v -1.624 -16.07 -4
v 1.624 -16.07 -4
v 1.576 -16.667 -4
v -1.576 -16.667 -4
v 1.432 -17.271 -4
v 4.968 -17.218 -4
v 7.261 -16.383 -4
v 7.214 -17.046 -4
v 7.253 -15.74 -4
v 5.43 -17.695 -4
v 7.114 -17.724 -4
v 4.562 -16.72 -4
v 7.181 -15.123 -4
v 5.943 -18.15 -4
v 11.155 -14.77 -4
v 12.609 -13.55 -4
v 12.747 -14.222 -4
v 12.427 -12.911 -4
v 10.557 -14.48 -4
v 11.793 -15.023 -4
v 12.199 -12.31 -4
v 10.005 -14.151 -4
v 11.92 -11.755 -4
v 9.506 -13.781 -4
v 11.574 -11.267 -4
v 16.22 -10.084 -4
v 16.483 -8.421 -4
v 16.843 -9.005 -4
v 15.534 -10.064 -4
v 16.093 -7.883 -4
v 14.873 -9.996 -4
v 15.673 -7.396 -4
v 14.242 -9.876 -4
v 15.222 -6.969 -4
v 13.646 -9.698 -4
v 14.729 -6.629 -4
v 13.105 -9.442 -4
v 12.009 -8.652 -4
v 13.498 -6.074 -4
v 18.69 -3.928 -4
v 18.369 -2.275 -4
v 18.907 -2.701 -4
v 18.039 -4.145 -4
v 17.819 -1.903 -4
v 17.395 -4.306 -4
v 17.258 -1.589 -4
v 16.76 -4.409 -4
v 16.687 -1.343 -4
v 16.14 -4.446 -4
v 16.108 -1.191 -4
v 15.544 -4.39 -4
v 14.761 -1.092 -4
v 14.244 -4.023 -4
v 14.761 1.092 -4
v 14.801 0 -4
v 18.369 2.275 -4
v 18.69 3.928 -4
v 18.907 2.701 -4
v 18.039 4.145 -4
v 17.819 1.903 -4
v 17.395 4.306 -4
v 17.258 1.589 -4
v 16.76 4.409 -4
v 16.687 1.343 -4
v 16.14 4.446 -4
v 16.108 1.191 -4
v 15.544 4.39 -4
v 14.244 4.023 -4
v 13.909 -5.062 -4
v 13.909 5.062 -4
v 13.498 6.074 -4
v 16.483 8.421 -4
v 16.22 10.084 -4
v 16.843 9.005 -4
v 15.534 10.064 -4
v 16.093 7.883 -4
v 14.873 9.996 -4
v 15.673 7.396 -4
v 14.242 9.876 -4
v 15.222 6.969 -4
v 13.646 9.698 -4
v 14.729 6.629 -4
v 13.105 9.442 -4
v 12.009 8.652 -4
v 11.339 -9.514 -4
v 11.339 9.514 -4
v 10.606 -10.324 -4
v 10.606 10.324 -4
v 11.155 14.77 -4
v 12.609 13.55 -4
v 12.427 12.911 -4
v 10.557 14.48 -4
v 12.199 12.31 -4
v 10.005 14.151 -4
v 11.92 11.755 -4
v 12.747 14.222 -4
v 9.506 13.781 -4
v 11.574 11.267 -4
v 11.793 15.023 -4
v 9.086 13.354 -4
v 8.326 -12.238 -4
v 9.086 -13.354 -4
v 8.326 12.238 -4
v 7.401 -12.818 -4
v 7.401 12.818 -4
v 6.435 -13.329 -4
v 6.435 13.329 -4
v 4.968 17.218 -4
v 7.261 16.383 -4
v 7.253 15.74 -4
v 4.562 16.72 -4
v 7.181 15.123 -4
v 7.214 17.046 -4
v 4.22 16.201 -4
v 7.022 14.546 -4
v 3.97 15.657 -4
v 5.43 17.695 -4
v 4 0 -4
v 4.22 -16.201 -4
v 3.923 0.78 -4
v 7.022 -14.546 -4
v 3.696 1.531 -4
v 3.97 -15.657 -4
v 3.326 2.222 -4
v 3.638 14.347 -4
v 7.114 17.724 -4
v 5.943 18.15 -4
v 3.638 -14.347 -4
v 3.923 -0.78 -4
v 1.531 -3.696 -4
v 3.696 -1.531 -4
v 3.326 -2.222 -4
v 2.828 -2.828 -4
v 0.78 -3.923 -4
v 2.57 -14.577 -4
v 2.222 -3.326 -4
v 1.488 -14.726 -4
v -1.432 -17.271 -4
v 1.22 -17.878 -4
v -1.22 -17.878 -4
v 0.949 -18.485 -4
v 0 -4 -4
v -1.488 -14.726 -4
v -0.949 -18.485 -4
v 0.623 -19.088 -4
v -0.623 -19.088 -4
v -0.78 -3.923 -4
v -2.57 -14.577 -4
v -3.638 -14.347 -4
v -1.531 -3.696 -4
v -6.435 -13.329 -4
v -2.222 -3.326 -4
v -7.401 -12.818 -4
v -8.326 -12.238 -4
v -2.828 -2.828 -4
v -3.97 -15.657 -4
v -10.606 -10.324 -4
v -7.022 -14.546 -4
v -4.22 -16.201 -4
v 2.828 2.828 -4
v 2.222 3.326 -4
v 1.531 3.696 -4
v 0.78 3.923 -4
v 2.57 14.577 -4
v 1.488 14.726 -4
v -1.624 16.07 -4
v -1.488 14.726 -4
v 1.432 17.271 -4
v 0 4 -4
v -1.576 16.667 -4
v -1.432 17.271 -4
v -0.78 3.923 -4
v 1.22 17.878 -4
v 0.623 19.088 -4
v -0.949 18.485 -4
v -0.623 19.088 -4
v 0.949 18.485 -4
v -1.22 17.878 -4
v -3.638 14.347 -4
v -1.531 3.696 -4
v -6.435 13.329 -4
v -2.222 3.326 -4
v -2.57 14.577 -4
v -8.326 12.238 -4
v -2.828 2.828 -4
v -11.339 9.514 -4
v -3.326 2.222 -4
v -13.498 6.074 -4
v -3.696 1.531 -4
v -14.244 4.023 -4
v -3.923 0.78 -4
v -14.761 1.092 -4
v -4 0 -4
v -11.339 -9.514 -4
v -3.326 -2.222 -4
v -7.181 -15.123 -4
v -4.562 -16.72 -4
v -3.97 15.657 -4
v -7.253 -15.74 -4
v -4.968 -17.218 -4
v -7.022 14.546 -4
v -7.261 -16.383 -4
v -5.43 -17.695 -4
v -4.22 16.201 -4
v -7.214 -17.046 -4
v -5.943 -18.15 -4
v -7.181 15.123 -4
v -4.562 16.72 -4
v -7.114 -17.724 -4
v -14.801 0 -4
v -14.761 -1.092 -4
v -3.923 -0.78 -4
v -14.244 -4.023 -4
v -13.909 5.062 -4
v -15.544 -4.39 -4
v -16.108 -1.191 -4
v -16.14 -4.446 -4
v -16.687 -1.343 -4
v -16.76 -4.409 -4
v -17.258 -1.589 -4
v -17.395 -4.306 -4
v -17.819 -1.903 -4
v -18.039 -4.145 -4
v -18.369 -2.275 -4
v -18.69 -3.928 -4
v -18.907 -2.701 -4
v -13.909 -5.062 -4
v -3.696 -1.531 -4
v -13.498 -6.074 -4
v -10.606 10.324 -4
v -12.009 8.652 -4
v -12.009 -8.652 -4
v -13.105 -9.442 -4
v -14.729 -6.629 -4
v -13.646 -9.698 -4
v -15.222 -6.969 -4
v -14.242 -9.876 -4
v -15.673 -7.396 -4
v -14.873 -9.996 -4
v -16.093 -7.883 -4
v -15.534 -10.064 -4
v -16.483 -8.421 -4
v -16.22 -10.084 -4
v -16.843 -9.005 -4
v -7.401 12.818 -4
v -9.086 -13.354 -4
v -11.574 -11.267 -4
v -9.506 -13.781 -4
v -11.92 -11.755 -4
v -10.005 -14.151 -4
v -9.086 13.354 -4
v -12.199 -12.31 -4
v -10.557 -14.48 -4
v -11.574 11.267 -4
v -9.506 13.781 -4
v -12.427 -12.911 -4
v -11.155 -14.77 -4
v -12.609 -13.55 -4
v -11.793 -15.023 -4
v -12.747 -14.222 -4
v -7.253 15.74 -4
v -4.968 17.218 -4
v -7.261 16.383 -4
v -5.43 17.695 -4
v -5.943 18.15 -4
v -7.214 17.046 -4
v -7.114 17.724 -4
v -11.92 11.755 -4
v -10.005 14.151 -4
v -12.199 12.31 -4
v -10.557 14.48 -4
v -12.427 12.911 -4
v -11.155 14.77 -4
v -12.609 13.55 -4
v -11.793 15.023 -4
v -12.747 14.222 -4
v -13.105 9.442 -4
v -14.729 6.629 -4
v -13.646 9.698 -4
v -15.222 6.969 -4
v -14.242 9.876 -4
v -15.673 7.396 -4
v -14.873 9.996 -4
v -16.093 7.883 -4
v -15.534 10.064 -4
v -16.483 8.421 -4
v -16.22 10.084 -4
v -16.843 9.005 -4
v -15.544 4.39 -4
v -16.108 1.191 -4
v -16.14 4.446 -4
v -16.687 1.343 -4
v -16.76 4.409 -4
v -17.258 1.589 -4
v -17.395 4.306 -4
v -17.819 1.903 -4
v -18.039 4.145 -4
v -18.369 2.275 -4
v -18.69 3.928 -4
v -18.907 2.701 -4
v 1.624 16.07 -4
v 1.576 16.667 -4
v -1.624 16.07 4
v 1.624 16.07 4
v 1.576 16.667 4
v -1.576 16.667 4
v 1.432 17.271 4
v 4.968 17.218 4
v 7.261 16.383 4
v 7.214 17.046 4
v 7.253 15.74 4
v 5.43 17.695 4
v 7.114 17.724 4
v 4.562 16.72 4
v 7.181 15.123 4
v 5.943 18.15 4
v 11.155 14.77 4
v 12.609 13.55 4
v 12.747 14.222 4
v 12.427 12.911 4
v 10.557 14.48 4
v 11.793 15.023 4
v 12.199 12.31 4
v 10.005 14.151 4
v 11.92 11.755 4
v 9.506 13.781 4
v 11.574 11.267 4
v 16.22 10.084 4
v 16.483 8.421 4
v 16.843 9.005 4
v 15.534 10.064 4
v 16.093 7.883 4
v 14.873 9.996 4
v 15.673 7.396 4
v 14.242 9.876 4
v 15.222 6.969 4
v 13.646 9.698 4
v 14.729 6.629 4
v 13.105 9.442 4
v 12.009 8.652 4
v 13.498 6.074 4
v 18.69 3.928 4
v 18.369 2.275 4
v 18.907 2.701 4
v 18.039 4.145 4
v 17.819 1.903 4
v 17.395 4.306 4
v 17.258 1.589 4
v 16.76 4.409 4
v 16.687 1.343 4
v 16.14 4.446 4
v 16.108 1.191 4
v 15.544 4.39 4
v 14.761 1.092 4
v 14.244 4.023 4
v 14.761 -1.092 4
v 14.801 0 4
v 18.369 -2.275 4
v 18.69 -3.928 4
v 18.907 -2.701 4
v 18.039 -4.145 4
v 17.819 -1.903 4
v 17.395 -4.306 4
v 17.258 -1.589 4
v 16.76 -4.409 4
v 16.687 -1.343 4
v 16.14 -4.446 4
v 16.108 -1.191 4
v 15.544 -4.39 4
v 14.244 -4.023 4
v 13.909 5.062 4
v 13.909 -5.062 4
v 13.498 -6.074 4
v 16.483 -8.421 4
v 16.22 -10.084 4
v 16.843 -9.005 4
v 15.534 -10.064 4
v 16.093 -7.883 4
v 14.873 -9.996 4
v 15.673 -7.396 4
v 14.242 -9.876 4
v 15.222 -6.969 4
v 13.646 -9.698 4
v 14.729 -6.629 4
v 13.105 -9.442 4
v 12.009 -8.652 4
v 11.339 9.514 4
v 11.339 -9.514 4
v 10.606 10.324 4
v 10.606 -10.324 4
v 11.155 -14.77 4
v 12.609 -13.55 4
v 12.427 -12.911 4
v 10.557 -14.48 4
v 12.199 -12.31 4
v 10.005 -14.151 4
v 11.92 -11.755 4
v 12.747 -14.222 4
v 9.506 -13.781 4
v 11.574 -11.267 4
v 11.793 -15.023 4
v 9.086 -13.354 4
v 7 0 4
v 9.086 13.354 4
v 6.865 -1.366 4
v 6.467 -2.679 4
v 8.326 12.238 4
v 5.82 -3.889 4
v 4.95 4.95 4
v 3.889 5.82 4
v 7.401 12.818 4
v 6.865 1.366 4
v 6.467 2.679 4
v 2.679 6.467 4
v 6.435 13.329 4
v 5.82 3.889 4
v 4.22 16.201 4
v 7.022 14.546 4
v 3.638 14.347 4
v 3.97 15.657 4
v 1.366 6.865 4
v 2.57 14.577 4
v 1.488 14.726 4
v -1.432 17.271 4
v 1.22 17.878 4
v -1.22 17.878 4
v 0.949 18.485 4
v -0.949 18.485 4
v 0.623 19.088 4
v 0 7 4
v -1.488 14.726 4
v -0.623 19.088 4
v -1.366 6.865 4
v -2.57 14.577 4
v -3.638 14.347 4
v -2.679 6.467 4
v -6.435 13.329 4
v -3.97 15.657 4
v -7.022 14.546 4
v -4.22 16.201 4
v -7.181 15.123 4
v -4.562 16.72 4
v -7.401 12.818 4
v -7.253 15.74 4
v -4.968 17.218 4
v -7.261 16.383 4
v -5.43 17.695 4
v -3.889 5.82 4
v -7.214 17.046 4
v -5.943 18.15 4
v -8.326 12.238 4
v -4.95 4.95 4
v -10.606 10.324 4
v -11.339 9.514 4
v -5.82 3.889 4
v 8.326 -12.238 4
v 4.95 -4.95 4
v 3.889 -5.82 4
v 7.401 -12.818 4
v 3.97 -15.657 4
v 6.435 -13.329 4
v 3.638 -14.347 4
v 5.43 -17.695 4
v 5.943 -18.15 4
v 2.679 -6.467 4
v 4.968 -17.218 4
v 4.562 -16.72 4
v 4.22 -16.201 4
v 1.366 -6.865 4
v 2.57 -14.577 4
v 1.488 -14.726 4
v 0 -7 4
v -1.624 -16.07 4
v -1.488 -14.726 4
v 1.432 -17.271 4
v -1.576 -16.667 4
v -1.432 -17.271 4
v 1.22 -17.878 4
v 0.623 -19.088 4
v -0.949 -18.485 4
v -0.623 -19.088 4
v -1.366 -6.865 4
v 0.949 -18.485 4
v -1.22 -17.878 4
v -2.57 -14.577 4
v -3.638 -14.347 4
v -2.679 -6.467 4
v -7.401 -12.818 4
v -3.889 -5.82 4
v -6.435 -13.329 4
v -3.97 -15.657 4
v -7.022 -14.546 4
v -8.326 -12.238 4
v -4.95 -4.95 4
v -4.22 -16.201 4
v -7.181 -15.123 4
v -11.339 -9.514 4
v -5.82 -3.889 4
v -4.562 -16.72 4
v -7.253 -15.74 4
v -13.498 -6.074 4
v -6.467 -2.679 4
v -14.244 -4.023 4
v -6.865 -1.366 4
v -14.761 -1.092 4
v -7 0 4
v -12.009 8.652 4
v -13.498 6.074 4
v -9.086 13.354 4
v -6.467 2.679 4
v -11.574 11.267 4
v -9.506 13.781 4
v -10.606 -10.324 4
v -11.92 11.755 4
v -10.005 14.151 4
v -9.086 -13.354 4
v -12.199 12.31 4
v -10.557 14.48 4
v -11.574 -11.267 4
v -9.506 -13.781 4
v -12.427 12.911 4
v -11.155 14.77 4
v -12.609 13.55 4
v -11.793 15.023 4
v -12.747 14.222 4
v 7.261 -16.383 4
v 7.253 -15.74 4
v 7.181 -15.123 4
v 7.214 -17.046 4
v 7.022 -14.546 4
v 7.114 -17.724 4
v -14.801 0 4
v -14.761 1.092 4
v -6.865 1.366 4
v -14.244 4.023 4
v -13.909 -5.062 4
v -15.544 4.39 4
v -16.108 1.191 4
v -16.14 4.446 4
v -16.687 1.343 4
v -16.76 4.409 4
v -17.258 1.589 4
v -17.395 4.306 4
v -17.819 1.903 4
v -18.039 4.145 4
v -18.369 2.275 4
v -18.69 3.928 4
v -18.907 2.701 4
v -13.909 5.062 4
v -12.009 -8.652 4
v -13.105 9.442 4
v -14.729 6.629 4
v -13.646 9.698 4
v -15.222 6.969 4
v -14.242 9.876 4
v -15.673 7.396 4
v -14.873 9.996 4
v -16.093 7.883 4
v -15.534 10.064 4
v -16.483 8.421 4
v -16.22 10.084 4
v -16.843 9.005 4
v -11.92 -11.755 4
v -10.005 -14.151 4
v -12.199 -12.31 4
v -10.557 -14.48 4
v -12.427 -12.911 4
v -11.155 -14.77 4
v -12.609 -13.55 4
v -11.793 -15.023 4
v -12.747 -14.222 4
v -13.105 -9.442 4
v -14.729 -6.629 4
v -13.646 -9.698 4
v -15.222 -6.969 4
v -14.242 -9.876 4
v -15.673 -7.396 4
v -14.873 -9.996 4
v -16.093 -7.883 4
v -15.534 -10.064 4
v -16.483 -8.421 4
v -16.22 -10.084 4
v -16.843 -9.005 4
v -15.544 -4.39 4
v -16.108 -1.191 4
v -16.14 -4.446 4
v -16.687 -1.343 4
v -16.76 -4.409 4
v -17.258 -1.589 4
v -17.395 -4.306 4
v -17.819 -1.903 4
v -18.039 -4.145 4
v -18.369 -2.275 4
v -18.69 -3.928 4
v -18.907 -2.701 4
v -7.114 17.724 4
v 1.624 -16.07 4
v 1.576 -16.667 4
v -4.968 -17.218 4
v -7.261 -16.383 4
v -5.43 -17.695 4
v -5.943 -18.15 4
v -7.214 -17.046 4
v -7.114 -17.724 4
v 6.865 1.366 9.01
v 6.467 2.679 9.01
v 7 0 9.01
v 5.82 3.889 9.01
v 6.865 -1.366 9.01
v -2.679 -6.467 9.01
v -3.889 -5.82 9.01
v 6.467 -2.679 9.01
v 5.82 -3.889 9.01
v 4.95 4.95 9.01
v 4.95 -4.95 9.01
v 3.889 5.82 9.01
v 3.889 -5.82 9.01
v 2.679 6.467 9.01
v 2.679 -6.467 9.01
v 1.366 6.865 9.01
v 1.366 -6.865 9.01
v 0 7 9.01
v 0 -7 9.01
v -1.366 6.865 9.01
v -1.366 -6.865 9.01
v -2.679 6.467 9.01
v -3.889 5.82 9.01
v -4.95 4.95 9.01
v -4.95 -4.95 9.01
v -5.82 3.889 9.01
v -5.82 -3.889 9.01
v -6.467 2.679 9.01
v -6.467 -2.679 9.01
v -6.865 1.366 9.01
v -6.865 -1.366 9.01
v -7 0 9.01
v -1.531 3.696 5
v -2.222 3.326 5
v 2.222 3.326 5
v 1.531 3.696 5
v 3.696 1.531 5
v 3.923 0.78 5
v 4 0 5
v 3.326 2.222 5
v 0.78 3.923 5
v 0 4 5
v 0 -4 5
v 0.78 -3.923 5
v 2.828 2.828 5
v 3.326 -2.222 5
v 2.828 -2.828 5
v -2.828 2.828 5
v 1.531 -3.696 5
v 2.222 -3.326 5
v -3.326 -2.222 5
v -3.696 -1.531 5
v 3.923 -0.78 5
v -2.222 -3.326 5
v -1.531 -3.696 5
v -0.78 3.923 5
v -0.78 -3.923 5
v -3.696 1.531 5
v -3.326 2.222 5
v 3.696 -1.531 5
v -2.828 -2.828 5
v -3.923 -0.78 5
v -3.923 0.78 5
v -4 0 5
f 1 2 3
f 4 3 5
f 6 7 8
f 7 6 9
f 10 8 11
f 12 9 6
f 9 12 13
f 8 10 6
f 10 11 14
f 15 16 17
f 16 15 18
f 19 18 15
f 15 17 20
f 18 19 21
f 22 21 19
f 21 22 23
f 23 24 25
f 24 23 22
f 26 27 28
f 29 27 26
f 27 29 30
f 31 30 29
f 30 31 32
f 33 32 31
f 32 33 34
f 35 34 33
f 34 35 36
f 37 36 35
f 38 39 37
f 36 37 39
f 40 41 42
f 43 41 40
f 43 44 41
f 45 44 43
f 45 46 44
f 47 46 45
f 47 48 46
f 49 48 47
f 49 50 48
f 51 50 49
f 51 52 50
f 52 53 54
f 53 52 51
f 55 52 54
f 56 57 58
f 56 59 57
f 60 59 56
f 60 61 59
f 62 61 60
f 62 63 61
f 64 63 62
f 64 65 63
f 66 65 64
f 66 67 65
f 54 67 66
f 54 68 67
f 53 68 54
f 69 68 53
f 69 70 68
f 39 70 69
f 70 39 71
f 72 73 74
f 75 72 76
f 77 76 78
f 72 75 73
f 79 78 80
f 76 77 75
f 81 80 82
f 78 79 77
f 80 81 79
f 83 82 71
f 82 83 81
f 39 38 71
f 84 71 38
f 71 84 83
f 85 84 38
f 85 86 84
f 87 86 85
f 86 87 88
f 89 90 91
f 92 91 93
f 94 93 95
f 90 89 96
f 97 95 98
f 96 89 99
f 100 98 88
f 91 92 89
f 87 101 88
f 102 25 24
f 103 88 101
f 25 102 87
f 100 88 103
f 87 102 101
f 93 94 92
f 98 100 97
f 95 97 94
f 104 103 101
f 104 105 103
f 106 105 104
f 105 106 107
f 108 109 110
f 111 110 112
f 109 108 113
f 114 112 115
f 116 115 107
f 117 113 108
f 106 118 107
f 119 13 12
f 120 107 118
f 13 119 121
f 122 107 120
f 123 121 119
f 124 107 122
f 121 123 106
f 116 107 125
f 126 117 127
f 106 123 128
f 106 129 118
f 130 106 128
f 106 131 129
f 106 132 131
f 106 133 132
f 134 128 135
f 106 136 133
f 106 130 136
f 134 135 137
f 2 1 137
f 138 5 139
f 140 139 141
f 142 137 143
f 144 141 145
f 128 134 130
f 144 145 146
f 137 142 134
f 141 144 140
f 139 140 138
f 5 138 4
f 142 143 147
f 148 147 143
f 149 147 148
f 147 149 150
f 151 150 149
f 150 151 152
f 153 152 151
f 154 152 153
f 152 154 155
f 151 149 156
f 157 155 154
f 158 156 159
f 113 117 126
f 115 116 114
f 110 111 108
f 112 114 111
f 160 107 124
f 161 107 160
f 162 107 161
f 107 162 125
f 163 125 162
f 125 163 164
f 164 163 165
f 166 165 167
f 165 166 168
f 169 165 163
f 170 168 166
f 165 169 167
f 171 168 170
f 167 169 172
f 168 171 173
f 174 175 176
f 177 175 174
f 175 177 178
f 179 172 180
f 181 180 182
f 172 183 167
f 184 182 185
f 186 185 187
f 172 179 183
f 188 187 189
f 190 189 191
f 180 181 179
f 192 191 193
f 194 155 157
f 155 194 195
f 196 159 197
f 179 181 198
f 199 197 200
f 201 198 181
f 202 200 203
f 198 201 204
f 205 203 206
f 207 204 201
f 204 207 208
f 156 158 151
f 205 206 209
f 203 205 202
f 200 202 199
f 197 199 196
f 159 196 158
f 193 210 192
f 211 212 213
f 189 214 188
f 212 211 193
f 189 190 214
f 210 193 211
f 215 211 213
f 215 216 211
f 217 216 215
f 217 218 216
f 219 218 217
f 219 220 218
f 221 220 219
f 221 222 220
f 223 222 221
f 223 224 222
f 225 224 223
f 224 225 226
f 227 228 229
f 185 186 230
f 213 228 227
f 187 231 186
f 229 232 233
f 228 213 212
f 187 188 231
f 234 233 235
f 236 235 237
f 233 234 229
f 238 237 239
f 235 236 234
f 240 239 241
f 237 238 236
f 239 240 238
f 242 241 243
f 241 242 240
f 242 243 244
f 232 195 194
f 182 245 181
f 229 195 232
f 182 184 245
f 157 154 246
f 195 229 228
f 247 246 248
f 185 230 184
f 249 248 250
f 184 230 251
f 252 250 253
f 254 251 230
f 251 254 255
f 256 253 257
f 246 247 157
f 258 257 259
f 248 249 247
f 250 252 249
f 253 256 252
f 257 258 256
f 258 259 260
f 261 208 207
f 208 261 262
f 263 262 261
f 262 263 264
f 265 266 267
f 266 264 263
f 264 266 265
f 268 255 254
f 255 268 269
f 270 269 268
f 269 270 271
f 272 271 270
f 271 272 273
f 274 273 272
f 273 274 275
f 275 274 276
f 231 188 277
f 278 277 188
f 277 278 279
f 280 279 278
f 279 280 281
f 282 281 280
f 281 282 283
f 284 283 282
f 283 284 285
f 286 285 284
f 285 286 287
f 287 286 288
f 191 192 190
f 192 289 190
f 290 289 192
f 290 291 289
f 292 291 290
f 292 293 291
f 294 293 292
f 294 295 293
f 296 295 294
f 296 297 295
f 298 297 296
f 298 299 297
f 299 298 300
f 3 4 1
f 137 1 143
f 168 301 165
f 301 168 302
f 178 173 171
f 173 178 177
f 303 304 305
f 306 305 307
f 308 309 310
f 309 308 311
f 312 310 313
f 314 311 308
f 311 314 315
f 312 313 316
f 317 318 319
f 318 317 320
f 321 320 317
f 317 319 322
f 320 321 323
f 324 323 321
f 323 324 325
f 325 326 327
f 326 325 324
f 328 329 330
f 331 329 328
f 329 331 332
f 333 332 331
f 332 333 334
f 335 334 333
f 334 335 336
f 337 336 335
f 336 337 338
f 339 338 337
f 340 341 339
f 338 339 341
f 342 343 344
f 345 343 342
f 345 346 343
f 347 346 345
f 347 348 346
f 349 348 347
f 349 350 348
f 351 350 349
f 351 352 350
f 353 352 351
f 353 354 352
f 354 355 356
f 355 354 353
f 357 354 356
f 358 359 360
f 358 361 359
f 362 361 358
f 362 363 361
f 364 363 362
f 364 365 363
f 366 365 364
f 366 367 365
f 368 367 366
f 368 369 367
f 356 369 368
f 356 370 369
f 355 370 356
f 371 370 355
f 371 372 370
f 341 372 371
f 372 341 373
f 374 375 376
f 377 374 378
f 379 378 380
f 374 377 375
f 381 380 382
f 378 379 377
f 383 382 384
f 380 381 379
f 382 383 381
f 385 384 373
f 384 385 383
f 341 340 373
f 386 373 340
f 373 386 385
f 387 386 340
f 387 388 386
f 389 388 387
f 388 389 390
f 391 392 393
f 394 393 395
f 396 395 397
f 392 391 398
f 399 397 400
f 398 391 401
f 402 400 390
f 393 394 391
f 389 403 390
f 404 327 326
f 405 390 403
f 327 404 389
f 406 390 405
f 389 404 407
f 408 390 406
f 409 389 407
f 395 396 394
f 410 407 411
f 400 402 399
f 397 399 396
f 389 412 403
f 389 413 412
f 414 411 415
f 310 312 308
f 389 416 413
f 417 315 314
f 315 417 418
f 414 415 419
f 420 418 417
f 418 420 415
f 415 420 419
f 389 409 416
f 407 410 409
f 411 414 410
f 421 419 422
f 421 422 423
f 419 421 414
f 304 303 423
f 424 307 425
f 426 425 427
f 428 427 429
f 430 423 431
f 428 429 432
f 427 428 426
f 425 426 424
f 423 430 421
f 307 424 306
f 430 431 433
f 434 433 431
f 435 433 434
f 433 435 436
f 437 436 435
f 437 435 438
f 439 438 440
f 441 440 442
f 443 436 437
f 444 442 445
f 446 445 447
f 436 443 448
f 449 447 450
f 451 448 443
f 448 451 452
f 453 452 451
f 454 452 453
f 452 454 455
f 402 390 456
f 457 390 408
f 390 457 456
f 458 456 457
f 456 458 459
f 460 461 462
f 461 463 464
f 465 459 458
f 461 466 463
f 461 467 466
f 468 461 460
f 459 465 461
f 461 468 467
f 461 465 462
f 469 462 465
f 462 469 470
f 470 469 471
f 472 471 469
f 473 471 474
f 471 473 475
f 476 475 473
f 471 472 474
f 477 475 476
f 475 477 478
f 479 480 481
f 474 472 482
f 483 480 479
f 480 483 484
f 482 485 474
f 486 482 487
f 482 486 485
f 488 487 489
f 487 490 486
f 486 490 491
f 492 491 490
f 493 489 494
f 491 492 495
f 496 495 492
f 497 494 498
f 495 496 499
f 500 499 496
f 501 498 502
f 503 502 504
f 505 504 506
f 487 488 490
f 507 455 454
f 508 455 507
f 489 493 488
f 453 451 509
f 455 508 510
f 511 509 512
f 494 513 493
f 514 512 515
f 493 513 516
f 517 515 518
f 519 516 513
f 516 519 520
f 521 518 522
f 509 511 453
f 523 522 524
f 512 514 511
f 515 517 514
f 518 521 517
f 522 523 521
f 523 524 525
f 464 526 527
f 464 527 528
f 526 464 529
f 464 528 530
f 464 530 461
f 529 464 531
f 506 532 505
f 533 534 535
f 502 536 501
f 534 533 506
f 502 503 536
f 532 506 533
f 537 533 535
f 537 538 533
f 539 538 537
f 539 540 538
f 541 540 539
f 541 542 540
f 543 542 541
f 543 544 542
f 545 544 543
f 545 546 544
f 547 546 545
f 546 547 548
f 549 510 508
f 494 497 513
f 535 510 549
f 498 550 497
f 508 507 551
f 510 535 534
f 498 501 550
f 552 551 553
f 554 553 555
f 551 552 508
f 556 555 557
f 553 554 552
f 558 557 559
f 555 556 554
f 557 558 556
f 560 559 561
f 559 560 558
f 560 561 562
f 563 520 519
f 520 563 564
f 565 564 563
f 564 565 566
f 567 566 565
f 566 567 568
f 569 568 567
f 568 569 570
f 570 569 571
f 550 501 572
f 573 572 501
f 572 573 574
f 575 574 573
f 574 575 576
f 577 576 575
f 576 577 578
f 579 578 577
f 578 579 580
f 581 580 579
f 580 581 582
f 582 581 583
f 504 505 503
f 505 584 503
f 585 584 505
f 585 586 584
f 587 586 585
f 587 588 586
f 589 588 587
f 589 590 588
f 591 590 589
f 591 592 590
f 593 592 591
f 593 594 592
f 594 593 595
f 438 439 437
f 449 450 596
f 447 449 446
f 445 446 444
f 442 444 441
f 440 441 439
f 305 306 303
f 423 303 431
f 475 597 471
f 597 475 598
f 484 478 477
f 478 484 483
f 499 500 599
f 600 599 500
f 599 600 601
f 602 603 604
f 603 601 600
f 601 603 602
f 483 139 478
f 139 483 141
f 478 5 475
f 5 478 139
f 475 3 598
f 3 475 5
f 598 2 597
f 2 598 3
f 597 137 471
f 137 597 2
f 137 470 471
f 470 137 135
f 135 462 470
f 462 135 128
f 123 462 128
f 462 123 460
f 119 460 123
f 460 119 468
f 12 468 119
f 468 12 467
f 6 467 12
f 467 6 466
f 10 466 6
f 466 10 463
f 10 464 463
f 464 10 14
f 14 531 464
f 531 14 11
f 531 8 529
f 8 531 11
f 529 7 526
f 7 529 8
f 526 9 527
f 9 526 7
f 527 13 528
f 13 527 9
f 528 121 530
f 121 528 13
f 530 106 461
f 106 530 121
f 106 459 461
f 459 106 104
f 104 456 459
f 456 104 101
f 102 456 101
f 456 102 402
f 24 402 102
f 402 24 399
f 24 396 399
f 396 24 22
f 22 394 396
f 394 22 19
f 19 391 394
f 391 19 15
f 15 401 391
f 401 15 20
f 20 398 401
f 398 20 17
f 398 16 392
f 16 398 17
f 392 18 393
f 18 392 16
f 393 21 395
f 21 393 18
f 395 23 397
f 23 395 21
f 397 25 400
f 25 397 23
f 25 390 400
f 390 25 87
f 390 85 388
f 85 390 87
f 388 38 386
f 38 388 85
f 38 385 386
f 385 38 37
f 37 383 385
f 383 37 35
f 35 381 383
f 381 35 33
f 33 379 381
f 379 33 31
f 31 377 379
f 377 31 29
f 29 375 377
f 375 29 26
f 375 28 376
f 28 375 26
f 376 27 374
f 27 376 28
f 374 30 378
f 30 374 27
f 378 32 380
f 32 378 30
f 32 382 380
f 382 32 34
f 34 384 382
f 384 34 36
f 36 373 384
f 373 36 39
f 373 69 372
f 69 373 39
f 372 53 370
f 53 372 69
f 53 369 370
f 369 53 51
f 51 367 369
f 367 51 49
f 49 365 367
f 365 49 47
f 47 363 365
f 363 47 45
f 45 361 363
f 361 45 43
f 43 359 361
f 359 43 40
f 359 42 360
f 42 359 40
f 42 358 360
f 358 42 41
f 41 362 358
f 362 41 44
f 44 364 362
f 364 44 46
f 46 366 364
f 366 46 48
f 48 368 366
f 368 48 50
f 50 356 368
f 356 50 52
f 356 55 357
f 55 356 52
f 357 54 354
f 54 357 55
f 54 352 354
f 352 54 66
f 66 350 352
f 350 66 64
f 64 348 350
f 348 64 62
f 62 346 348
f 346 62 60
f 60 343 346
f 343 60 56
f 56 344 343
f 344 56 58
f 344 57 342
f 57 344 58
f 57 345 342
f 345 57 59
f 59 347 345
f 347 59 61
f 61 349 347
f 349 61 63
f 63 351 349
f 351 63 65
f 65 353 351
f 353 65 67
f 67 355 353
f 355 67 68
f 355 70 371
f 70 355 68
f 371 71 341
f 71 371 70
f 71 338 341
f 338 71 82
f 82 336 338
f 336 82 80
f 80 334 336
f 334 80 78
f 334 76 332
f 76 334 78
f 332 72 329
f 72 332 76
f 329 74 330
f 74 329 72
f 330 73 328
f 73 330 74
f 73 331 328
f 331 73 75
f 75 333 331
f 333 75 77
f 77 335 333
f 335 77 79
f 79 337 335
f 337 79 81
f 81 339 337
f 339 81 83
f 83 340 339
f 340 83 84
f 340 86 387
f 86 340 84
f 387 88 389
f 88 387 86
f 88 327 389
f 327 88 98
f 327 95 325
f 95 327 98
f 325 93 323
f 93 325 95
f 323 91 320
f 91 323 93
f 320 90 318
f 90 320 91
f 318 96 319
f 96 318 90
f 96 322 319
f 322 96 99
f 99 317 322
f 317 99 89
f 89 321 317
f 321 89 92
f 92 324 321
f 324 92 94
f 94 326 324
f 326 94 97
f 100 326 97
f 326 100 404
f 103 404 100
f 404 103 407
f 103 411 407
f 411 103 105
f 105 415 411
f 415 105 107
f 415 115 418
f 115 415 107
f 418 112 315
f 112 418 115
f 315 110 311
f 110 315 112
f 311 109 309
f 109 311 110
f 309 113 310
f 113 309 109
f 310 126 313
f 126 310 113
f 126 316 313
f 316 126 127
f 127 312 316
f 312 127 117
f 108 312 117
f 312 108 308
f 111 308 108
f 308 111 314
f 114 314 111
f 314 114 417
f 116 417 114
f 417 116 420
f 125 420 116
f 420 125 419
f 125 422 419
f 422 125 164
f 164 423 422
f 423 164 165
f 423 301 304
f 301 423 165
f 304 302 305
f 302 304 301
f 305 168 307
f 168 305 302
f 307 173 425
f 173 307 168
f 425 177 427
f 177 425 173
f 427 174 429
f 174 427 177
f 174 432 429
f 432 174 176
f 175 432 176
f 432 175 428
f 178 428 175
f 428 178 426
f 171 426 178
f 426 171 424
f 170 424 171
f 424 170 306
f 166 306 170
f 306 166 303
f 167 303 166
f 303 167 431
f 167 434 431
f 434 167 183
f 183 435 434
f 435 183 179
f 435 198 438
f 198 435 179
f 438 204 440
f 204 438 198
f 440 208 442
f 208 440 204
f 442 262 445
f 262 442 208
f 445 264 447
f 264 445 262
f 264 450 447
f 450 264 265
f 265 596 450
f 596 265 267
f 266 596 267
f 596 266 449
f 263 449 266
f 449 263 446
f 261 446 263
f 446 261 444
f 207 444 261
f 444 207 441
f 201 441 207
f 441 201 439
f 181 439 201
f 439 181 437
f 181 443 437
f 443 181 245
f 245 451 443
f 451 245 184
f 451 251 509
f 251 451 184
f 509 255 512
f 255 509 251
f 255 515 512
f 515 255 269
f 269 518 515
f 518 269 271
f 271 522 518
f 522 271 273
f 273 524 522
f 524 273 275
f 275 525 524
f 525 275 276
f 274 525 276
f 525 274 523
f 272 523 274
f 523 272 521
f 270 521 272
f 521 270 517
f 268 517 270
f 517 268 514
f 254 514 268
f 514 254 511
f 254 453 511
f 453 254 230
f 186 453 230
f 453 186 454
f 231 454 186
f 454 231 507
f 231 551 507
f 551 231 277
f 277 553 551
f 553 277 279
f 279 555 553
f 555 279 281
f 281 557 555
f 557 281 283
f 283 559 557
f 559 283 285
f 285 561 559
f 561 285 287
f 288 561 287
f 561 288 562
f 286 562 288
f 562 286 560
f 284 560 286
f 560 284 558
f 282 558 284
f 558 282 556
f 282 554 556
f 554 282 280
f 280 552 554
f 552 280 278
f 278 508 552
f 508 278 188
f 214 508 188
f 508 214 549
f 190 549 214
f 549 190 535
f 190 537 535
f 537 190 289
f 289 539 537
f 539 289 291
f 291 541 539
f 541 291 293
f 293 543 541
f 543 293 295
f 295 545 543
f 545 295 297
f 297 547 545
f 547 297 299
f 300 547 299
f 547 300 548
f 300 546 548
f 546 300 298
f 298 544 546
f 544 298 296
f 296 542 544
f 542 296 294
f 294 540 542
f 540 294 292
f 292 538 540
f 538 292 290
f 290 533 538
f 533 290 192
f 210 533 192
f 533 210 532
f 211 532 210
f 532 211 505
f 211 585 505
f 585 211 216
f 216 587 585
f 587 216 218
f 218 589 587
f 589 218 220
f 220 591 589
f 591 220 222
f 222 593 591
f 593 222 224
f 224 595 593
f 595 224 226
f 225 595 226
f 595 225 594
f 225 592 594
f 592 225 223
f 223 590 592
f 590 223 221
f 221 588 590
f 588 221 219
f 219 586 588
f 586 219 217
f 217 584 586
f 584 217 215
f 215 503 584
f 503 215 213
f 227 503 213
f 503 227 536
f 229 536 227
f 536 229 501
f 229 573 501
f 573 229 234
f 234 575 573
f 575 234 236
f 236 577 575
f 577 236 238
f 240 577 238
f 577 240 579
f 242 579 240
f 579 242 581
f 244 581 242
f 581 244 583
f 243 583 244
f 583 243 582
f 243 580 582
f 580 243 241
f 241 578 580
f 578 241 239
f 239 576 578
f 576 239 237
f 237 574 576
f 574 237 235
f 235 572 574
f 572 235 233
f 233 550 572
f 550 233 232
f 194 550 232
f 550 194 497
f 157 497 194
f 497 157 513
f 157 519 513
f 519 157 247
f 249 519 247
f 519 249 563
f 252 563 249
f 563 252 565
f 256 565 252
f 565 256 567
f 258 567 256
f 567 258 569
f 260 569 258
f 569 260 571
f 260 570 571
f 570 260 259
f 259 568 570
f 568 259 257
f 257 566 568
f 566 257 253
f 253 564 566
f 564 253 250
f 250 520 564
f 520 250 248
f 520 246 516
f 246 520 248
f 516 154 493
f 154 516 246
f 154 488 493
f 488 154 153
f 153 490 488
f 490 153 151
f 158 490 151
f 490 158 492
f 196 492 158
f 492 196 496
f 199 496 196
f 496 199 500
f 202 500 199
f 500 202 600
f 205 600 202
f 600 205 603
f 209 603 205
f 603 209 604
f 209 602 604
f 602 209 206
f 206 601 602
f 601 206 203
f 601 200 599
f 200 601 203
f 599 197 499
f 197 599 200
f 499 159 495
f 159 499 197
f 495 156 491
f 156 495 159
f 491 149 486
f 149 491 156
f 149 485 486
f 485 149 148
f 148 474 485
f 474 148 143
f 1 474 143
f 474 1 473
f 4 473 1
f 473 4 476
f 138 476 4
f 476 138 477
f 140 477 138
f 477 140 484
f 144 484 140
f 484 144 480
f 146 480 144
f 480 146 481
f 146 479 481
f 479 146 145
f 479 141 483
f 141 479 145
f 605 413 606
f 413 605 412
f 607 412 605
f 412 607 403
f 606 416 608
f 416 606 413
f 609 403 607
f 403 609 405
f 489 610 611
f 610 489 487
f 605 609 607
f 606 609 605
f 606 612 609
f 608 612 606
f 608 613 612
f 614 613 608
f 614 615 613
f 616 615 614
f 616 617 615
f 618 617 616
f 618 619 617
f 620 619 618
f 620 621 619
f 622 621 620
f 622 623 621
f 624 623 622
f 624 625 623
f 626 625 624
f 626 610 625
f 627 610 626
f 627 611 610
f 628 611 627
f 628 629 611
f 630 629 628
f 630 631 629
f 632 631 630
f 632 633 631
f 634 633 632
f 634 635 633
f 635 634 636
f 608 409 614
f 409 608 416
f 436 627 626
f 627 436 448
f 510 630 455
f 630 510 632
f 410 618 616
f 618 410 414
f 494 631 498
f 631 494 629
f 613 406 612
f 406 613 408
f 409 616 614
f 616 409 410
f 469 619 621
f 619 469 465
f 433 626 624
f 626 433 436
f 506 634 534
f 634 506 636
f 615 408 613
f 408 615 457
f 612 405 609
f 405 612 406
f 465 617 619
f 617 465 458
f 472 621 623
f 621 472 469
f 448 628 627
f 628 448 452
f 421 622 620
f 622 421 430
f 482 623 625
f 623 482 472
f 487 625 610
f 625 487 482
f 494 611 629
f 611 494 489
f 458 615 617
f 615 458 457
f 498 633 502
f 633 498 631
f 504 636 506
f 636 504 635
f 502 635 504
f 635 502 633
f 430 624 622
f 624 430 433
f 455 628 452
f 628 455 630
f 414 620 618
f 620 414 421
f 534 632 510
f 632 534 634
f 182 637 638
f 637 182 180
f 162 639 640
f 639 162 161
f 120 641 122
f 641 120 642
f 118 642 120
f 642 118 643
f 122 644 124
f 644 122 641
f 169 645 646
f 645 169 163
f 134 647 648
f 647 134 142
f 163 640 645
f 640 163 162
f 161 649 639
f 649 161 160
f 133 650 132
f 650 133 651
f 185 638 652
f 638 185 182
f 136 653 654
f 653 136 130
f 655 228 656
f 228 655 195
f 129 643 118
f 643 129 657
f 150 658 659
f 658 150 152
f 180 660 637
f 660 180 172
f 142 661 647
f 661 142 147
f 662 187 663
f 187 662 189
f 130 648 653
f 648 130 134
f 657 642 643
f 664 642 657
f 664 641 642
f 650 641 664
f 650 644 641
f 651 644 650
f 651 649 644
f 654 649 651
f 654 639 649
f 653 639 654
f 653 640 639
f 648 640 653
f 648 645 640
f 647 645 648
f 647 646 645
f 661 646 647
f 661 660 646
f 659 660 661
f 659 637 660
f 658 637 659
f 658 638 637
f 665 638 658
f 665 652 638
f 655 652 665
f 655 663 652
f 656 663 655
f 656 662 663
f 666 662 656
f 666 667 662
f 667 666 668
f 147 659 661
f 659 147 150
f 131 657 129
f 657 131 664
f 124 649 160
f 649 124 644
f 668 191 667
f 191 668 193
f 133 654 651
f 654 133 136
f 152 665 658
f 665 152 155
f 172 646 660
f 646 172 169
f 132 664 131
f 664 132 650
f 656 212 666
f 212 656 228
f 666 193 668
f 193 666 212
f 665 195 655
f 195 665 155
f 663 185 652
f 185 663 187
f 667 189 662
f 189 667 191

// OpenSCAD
// WebCAD Parametric Spur Gear Generator
// Uses high-performance native GEOL involute_gears library.

use <../GEOL/involute_gears.scad>

// --- Parameters ---
// Number of teeth
teeth = 18; // [10:1:50]
// mm per tooth (circular pitch)
mm_per_tooth = 6; // [2:1:30]
// Width (thickness) of the gear
thickness = 8; // [2:1:30]
// Bore (center hole) diameter
bore_diameter = 8; // [3:1:25]
// Backlash (tooth spacing clearance)
backlash = 0.1; // [0:0.05:1]
// Hub diameter (0 to disable)
hub_diameter = 14; // [0:1:50]
// Hub height (0 to disable)
hub_height = 5; // [0:1:20]

echo("--- GENERATING PARAMETRIC GEOL GEAR ---");
echo("Teeth count:", teeth);
echo("mm per tooth:", mm_per_tooth);
echo("Gear thickness:", thickness);
echo("Bore diameter:", bore_diameter);
echo("Hub diameter:", hub_diameter);
echo("Hub height:", hub_height);

// Generate the spur gear using high-performance GEOL library
gear(
    mm_per_tooth=mm_per_tooth,
    number_of_teeth=teeth,
    thickness=thickness,
    hole_diameter=bore_diameter,
    hub_d=hub_diameter,
    hub_h=hub_height,
    backlash=backlash,
    pressure_angle=20
);

echo("--- GEAR GENERATION COMPLETE ---");
